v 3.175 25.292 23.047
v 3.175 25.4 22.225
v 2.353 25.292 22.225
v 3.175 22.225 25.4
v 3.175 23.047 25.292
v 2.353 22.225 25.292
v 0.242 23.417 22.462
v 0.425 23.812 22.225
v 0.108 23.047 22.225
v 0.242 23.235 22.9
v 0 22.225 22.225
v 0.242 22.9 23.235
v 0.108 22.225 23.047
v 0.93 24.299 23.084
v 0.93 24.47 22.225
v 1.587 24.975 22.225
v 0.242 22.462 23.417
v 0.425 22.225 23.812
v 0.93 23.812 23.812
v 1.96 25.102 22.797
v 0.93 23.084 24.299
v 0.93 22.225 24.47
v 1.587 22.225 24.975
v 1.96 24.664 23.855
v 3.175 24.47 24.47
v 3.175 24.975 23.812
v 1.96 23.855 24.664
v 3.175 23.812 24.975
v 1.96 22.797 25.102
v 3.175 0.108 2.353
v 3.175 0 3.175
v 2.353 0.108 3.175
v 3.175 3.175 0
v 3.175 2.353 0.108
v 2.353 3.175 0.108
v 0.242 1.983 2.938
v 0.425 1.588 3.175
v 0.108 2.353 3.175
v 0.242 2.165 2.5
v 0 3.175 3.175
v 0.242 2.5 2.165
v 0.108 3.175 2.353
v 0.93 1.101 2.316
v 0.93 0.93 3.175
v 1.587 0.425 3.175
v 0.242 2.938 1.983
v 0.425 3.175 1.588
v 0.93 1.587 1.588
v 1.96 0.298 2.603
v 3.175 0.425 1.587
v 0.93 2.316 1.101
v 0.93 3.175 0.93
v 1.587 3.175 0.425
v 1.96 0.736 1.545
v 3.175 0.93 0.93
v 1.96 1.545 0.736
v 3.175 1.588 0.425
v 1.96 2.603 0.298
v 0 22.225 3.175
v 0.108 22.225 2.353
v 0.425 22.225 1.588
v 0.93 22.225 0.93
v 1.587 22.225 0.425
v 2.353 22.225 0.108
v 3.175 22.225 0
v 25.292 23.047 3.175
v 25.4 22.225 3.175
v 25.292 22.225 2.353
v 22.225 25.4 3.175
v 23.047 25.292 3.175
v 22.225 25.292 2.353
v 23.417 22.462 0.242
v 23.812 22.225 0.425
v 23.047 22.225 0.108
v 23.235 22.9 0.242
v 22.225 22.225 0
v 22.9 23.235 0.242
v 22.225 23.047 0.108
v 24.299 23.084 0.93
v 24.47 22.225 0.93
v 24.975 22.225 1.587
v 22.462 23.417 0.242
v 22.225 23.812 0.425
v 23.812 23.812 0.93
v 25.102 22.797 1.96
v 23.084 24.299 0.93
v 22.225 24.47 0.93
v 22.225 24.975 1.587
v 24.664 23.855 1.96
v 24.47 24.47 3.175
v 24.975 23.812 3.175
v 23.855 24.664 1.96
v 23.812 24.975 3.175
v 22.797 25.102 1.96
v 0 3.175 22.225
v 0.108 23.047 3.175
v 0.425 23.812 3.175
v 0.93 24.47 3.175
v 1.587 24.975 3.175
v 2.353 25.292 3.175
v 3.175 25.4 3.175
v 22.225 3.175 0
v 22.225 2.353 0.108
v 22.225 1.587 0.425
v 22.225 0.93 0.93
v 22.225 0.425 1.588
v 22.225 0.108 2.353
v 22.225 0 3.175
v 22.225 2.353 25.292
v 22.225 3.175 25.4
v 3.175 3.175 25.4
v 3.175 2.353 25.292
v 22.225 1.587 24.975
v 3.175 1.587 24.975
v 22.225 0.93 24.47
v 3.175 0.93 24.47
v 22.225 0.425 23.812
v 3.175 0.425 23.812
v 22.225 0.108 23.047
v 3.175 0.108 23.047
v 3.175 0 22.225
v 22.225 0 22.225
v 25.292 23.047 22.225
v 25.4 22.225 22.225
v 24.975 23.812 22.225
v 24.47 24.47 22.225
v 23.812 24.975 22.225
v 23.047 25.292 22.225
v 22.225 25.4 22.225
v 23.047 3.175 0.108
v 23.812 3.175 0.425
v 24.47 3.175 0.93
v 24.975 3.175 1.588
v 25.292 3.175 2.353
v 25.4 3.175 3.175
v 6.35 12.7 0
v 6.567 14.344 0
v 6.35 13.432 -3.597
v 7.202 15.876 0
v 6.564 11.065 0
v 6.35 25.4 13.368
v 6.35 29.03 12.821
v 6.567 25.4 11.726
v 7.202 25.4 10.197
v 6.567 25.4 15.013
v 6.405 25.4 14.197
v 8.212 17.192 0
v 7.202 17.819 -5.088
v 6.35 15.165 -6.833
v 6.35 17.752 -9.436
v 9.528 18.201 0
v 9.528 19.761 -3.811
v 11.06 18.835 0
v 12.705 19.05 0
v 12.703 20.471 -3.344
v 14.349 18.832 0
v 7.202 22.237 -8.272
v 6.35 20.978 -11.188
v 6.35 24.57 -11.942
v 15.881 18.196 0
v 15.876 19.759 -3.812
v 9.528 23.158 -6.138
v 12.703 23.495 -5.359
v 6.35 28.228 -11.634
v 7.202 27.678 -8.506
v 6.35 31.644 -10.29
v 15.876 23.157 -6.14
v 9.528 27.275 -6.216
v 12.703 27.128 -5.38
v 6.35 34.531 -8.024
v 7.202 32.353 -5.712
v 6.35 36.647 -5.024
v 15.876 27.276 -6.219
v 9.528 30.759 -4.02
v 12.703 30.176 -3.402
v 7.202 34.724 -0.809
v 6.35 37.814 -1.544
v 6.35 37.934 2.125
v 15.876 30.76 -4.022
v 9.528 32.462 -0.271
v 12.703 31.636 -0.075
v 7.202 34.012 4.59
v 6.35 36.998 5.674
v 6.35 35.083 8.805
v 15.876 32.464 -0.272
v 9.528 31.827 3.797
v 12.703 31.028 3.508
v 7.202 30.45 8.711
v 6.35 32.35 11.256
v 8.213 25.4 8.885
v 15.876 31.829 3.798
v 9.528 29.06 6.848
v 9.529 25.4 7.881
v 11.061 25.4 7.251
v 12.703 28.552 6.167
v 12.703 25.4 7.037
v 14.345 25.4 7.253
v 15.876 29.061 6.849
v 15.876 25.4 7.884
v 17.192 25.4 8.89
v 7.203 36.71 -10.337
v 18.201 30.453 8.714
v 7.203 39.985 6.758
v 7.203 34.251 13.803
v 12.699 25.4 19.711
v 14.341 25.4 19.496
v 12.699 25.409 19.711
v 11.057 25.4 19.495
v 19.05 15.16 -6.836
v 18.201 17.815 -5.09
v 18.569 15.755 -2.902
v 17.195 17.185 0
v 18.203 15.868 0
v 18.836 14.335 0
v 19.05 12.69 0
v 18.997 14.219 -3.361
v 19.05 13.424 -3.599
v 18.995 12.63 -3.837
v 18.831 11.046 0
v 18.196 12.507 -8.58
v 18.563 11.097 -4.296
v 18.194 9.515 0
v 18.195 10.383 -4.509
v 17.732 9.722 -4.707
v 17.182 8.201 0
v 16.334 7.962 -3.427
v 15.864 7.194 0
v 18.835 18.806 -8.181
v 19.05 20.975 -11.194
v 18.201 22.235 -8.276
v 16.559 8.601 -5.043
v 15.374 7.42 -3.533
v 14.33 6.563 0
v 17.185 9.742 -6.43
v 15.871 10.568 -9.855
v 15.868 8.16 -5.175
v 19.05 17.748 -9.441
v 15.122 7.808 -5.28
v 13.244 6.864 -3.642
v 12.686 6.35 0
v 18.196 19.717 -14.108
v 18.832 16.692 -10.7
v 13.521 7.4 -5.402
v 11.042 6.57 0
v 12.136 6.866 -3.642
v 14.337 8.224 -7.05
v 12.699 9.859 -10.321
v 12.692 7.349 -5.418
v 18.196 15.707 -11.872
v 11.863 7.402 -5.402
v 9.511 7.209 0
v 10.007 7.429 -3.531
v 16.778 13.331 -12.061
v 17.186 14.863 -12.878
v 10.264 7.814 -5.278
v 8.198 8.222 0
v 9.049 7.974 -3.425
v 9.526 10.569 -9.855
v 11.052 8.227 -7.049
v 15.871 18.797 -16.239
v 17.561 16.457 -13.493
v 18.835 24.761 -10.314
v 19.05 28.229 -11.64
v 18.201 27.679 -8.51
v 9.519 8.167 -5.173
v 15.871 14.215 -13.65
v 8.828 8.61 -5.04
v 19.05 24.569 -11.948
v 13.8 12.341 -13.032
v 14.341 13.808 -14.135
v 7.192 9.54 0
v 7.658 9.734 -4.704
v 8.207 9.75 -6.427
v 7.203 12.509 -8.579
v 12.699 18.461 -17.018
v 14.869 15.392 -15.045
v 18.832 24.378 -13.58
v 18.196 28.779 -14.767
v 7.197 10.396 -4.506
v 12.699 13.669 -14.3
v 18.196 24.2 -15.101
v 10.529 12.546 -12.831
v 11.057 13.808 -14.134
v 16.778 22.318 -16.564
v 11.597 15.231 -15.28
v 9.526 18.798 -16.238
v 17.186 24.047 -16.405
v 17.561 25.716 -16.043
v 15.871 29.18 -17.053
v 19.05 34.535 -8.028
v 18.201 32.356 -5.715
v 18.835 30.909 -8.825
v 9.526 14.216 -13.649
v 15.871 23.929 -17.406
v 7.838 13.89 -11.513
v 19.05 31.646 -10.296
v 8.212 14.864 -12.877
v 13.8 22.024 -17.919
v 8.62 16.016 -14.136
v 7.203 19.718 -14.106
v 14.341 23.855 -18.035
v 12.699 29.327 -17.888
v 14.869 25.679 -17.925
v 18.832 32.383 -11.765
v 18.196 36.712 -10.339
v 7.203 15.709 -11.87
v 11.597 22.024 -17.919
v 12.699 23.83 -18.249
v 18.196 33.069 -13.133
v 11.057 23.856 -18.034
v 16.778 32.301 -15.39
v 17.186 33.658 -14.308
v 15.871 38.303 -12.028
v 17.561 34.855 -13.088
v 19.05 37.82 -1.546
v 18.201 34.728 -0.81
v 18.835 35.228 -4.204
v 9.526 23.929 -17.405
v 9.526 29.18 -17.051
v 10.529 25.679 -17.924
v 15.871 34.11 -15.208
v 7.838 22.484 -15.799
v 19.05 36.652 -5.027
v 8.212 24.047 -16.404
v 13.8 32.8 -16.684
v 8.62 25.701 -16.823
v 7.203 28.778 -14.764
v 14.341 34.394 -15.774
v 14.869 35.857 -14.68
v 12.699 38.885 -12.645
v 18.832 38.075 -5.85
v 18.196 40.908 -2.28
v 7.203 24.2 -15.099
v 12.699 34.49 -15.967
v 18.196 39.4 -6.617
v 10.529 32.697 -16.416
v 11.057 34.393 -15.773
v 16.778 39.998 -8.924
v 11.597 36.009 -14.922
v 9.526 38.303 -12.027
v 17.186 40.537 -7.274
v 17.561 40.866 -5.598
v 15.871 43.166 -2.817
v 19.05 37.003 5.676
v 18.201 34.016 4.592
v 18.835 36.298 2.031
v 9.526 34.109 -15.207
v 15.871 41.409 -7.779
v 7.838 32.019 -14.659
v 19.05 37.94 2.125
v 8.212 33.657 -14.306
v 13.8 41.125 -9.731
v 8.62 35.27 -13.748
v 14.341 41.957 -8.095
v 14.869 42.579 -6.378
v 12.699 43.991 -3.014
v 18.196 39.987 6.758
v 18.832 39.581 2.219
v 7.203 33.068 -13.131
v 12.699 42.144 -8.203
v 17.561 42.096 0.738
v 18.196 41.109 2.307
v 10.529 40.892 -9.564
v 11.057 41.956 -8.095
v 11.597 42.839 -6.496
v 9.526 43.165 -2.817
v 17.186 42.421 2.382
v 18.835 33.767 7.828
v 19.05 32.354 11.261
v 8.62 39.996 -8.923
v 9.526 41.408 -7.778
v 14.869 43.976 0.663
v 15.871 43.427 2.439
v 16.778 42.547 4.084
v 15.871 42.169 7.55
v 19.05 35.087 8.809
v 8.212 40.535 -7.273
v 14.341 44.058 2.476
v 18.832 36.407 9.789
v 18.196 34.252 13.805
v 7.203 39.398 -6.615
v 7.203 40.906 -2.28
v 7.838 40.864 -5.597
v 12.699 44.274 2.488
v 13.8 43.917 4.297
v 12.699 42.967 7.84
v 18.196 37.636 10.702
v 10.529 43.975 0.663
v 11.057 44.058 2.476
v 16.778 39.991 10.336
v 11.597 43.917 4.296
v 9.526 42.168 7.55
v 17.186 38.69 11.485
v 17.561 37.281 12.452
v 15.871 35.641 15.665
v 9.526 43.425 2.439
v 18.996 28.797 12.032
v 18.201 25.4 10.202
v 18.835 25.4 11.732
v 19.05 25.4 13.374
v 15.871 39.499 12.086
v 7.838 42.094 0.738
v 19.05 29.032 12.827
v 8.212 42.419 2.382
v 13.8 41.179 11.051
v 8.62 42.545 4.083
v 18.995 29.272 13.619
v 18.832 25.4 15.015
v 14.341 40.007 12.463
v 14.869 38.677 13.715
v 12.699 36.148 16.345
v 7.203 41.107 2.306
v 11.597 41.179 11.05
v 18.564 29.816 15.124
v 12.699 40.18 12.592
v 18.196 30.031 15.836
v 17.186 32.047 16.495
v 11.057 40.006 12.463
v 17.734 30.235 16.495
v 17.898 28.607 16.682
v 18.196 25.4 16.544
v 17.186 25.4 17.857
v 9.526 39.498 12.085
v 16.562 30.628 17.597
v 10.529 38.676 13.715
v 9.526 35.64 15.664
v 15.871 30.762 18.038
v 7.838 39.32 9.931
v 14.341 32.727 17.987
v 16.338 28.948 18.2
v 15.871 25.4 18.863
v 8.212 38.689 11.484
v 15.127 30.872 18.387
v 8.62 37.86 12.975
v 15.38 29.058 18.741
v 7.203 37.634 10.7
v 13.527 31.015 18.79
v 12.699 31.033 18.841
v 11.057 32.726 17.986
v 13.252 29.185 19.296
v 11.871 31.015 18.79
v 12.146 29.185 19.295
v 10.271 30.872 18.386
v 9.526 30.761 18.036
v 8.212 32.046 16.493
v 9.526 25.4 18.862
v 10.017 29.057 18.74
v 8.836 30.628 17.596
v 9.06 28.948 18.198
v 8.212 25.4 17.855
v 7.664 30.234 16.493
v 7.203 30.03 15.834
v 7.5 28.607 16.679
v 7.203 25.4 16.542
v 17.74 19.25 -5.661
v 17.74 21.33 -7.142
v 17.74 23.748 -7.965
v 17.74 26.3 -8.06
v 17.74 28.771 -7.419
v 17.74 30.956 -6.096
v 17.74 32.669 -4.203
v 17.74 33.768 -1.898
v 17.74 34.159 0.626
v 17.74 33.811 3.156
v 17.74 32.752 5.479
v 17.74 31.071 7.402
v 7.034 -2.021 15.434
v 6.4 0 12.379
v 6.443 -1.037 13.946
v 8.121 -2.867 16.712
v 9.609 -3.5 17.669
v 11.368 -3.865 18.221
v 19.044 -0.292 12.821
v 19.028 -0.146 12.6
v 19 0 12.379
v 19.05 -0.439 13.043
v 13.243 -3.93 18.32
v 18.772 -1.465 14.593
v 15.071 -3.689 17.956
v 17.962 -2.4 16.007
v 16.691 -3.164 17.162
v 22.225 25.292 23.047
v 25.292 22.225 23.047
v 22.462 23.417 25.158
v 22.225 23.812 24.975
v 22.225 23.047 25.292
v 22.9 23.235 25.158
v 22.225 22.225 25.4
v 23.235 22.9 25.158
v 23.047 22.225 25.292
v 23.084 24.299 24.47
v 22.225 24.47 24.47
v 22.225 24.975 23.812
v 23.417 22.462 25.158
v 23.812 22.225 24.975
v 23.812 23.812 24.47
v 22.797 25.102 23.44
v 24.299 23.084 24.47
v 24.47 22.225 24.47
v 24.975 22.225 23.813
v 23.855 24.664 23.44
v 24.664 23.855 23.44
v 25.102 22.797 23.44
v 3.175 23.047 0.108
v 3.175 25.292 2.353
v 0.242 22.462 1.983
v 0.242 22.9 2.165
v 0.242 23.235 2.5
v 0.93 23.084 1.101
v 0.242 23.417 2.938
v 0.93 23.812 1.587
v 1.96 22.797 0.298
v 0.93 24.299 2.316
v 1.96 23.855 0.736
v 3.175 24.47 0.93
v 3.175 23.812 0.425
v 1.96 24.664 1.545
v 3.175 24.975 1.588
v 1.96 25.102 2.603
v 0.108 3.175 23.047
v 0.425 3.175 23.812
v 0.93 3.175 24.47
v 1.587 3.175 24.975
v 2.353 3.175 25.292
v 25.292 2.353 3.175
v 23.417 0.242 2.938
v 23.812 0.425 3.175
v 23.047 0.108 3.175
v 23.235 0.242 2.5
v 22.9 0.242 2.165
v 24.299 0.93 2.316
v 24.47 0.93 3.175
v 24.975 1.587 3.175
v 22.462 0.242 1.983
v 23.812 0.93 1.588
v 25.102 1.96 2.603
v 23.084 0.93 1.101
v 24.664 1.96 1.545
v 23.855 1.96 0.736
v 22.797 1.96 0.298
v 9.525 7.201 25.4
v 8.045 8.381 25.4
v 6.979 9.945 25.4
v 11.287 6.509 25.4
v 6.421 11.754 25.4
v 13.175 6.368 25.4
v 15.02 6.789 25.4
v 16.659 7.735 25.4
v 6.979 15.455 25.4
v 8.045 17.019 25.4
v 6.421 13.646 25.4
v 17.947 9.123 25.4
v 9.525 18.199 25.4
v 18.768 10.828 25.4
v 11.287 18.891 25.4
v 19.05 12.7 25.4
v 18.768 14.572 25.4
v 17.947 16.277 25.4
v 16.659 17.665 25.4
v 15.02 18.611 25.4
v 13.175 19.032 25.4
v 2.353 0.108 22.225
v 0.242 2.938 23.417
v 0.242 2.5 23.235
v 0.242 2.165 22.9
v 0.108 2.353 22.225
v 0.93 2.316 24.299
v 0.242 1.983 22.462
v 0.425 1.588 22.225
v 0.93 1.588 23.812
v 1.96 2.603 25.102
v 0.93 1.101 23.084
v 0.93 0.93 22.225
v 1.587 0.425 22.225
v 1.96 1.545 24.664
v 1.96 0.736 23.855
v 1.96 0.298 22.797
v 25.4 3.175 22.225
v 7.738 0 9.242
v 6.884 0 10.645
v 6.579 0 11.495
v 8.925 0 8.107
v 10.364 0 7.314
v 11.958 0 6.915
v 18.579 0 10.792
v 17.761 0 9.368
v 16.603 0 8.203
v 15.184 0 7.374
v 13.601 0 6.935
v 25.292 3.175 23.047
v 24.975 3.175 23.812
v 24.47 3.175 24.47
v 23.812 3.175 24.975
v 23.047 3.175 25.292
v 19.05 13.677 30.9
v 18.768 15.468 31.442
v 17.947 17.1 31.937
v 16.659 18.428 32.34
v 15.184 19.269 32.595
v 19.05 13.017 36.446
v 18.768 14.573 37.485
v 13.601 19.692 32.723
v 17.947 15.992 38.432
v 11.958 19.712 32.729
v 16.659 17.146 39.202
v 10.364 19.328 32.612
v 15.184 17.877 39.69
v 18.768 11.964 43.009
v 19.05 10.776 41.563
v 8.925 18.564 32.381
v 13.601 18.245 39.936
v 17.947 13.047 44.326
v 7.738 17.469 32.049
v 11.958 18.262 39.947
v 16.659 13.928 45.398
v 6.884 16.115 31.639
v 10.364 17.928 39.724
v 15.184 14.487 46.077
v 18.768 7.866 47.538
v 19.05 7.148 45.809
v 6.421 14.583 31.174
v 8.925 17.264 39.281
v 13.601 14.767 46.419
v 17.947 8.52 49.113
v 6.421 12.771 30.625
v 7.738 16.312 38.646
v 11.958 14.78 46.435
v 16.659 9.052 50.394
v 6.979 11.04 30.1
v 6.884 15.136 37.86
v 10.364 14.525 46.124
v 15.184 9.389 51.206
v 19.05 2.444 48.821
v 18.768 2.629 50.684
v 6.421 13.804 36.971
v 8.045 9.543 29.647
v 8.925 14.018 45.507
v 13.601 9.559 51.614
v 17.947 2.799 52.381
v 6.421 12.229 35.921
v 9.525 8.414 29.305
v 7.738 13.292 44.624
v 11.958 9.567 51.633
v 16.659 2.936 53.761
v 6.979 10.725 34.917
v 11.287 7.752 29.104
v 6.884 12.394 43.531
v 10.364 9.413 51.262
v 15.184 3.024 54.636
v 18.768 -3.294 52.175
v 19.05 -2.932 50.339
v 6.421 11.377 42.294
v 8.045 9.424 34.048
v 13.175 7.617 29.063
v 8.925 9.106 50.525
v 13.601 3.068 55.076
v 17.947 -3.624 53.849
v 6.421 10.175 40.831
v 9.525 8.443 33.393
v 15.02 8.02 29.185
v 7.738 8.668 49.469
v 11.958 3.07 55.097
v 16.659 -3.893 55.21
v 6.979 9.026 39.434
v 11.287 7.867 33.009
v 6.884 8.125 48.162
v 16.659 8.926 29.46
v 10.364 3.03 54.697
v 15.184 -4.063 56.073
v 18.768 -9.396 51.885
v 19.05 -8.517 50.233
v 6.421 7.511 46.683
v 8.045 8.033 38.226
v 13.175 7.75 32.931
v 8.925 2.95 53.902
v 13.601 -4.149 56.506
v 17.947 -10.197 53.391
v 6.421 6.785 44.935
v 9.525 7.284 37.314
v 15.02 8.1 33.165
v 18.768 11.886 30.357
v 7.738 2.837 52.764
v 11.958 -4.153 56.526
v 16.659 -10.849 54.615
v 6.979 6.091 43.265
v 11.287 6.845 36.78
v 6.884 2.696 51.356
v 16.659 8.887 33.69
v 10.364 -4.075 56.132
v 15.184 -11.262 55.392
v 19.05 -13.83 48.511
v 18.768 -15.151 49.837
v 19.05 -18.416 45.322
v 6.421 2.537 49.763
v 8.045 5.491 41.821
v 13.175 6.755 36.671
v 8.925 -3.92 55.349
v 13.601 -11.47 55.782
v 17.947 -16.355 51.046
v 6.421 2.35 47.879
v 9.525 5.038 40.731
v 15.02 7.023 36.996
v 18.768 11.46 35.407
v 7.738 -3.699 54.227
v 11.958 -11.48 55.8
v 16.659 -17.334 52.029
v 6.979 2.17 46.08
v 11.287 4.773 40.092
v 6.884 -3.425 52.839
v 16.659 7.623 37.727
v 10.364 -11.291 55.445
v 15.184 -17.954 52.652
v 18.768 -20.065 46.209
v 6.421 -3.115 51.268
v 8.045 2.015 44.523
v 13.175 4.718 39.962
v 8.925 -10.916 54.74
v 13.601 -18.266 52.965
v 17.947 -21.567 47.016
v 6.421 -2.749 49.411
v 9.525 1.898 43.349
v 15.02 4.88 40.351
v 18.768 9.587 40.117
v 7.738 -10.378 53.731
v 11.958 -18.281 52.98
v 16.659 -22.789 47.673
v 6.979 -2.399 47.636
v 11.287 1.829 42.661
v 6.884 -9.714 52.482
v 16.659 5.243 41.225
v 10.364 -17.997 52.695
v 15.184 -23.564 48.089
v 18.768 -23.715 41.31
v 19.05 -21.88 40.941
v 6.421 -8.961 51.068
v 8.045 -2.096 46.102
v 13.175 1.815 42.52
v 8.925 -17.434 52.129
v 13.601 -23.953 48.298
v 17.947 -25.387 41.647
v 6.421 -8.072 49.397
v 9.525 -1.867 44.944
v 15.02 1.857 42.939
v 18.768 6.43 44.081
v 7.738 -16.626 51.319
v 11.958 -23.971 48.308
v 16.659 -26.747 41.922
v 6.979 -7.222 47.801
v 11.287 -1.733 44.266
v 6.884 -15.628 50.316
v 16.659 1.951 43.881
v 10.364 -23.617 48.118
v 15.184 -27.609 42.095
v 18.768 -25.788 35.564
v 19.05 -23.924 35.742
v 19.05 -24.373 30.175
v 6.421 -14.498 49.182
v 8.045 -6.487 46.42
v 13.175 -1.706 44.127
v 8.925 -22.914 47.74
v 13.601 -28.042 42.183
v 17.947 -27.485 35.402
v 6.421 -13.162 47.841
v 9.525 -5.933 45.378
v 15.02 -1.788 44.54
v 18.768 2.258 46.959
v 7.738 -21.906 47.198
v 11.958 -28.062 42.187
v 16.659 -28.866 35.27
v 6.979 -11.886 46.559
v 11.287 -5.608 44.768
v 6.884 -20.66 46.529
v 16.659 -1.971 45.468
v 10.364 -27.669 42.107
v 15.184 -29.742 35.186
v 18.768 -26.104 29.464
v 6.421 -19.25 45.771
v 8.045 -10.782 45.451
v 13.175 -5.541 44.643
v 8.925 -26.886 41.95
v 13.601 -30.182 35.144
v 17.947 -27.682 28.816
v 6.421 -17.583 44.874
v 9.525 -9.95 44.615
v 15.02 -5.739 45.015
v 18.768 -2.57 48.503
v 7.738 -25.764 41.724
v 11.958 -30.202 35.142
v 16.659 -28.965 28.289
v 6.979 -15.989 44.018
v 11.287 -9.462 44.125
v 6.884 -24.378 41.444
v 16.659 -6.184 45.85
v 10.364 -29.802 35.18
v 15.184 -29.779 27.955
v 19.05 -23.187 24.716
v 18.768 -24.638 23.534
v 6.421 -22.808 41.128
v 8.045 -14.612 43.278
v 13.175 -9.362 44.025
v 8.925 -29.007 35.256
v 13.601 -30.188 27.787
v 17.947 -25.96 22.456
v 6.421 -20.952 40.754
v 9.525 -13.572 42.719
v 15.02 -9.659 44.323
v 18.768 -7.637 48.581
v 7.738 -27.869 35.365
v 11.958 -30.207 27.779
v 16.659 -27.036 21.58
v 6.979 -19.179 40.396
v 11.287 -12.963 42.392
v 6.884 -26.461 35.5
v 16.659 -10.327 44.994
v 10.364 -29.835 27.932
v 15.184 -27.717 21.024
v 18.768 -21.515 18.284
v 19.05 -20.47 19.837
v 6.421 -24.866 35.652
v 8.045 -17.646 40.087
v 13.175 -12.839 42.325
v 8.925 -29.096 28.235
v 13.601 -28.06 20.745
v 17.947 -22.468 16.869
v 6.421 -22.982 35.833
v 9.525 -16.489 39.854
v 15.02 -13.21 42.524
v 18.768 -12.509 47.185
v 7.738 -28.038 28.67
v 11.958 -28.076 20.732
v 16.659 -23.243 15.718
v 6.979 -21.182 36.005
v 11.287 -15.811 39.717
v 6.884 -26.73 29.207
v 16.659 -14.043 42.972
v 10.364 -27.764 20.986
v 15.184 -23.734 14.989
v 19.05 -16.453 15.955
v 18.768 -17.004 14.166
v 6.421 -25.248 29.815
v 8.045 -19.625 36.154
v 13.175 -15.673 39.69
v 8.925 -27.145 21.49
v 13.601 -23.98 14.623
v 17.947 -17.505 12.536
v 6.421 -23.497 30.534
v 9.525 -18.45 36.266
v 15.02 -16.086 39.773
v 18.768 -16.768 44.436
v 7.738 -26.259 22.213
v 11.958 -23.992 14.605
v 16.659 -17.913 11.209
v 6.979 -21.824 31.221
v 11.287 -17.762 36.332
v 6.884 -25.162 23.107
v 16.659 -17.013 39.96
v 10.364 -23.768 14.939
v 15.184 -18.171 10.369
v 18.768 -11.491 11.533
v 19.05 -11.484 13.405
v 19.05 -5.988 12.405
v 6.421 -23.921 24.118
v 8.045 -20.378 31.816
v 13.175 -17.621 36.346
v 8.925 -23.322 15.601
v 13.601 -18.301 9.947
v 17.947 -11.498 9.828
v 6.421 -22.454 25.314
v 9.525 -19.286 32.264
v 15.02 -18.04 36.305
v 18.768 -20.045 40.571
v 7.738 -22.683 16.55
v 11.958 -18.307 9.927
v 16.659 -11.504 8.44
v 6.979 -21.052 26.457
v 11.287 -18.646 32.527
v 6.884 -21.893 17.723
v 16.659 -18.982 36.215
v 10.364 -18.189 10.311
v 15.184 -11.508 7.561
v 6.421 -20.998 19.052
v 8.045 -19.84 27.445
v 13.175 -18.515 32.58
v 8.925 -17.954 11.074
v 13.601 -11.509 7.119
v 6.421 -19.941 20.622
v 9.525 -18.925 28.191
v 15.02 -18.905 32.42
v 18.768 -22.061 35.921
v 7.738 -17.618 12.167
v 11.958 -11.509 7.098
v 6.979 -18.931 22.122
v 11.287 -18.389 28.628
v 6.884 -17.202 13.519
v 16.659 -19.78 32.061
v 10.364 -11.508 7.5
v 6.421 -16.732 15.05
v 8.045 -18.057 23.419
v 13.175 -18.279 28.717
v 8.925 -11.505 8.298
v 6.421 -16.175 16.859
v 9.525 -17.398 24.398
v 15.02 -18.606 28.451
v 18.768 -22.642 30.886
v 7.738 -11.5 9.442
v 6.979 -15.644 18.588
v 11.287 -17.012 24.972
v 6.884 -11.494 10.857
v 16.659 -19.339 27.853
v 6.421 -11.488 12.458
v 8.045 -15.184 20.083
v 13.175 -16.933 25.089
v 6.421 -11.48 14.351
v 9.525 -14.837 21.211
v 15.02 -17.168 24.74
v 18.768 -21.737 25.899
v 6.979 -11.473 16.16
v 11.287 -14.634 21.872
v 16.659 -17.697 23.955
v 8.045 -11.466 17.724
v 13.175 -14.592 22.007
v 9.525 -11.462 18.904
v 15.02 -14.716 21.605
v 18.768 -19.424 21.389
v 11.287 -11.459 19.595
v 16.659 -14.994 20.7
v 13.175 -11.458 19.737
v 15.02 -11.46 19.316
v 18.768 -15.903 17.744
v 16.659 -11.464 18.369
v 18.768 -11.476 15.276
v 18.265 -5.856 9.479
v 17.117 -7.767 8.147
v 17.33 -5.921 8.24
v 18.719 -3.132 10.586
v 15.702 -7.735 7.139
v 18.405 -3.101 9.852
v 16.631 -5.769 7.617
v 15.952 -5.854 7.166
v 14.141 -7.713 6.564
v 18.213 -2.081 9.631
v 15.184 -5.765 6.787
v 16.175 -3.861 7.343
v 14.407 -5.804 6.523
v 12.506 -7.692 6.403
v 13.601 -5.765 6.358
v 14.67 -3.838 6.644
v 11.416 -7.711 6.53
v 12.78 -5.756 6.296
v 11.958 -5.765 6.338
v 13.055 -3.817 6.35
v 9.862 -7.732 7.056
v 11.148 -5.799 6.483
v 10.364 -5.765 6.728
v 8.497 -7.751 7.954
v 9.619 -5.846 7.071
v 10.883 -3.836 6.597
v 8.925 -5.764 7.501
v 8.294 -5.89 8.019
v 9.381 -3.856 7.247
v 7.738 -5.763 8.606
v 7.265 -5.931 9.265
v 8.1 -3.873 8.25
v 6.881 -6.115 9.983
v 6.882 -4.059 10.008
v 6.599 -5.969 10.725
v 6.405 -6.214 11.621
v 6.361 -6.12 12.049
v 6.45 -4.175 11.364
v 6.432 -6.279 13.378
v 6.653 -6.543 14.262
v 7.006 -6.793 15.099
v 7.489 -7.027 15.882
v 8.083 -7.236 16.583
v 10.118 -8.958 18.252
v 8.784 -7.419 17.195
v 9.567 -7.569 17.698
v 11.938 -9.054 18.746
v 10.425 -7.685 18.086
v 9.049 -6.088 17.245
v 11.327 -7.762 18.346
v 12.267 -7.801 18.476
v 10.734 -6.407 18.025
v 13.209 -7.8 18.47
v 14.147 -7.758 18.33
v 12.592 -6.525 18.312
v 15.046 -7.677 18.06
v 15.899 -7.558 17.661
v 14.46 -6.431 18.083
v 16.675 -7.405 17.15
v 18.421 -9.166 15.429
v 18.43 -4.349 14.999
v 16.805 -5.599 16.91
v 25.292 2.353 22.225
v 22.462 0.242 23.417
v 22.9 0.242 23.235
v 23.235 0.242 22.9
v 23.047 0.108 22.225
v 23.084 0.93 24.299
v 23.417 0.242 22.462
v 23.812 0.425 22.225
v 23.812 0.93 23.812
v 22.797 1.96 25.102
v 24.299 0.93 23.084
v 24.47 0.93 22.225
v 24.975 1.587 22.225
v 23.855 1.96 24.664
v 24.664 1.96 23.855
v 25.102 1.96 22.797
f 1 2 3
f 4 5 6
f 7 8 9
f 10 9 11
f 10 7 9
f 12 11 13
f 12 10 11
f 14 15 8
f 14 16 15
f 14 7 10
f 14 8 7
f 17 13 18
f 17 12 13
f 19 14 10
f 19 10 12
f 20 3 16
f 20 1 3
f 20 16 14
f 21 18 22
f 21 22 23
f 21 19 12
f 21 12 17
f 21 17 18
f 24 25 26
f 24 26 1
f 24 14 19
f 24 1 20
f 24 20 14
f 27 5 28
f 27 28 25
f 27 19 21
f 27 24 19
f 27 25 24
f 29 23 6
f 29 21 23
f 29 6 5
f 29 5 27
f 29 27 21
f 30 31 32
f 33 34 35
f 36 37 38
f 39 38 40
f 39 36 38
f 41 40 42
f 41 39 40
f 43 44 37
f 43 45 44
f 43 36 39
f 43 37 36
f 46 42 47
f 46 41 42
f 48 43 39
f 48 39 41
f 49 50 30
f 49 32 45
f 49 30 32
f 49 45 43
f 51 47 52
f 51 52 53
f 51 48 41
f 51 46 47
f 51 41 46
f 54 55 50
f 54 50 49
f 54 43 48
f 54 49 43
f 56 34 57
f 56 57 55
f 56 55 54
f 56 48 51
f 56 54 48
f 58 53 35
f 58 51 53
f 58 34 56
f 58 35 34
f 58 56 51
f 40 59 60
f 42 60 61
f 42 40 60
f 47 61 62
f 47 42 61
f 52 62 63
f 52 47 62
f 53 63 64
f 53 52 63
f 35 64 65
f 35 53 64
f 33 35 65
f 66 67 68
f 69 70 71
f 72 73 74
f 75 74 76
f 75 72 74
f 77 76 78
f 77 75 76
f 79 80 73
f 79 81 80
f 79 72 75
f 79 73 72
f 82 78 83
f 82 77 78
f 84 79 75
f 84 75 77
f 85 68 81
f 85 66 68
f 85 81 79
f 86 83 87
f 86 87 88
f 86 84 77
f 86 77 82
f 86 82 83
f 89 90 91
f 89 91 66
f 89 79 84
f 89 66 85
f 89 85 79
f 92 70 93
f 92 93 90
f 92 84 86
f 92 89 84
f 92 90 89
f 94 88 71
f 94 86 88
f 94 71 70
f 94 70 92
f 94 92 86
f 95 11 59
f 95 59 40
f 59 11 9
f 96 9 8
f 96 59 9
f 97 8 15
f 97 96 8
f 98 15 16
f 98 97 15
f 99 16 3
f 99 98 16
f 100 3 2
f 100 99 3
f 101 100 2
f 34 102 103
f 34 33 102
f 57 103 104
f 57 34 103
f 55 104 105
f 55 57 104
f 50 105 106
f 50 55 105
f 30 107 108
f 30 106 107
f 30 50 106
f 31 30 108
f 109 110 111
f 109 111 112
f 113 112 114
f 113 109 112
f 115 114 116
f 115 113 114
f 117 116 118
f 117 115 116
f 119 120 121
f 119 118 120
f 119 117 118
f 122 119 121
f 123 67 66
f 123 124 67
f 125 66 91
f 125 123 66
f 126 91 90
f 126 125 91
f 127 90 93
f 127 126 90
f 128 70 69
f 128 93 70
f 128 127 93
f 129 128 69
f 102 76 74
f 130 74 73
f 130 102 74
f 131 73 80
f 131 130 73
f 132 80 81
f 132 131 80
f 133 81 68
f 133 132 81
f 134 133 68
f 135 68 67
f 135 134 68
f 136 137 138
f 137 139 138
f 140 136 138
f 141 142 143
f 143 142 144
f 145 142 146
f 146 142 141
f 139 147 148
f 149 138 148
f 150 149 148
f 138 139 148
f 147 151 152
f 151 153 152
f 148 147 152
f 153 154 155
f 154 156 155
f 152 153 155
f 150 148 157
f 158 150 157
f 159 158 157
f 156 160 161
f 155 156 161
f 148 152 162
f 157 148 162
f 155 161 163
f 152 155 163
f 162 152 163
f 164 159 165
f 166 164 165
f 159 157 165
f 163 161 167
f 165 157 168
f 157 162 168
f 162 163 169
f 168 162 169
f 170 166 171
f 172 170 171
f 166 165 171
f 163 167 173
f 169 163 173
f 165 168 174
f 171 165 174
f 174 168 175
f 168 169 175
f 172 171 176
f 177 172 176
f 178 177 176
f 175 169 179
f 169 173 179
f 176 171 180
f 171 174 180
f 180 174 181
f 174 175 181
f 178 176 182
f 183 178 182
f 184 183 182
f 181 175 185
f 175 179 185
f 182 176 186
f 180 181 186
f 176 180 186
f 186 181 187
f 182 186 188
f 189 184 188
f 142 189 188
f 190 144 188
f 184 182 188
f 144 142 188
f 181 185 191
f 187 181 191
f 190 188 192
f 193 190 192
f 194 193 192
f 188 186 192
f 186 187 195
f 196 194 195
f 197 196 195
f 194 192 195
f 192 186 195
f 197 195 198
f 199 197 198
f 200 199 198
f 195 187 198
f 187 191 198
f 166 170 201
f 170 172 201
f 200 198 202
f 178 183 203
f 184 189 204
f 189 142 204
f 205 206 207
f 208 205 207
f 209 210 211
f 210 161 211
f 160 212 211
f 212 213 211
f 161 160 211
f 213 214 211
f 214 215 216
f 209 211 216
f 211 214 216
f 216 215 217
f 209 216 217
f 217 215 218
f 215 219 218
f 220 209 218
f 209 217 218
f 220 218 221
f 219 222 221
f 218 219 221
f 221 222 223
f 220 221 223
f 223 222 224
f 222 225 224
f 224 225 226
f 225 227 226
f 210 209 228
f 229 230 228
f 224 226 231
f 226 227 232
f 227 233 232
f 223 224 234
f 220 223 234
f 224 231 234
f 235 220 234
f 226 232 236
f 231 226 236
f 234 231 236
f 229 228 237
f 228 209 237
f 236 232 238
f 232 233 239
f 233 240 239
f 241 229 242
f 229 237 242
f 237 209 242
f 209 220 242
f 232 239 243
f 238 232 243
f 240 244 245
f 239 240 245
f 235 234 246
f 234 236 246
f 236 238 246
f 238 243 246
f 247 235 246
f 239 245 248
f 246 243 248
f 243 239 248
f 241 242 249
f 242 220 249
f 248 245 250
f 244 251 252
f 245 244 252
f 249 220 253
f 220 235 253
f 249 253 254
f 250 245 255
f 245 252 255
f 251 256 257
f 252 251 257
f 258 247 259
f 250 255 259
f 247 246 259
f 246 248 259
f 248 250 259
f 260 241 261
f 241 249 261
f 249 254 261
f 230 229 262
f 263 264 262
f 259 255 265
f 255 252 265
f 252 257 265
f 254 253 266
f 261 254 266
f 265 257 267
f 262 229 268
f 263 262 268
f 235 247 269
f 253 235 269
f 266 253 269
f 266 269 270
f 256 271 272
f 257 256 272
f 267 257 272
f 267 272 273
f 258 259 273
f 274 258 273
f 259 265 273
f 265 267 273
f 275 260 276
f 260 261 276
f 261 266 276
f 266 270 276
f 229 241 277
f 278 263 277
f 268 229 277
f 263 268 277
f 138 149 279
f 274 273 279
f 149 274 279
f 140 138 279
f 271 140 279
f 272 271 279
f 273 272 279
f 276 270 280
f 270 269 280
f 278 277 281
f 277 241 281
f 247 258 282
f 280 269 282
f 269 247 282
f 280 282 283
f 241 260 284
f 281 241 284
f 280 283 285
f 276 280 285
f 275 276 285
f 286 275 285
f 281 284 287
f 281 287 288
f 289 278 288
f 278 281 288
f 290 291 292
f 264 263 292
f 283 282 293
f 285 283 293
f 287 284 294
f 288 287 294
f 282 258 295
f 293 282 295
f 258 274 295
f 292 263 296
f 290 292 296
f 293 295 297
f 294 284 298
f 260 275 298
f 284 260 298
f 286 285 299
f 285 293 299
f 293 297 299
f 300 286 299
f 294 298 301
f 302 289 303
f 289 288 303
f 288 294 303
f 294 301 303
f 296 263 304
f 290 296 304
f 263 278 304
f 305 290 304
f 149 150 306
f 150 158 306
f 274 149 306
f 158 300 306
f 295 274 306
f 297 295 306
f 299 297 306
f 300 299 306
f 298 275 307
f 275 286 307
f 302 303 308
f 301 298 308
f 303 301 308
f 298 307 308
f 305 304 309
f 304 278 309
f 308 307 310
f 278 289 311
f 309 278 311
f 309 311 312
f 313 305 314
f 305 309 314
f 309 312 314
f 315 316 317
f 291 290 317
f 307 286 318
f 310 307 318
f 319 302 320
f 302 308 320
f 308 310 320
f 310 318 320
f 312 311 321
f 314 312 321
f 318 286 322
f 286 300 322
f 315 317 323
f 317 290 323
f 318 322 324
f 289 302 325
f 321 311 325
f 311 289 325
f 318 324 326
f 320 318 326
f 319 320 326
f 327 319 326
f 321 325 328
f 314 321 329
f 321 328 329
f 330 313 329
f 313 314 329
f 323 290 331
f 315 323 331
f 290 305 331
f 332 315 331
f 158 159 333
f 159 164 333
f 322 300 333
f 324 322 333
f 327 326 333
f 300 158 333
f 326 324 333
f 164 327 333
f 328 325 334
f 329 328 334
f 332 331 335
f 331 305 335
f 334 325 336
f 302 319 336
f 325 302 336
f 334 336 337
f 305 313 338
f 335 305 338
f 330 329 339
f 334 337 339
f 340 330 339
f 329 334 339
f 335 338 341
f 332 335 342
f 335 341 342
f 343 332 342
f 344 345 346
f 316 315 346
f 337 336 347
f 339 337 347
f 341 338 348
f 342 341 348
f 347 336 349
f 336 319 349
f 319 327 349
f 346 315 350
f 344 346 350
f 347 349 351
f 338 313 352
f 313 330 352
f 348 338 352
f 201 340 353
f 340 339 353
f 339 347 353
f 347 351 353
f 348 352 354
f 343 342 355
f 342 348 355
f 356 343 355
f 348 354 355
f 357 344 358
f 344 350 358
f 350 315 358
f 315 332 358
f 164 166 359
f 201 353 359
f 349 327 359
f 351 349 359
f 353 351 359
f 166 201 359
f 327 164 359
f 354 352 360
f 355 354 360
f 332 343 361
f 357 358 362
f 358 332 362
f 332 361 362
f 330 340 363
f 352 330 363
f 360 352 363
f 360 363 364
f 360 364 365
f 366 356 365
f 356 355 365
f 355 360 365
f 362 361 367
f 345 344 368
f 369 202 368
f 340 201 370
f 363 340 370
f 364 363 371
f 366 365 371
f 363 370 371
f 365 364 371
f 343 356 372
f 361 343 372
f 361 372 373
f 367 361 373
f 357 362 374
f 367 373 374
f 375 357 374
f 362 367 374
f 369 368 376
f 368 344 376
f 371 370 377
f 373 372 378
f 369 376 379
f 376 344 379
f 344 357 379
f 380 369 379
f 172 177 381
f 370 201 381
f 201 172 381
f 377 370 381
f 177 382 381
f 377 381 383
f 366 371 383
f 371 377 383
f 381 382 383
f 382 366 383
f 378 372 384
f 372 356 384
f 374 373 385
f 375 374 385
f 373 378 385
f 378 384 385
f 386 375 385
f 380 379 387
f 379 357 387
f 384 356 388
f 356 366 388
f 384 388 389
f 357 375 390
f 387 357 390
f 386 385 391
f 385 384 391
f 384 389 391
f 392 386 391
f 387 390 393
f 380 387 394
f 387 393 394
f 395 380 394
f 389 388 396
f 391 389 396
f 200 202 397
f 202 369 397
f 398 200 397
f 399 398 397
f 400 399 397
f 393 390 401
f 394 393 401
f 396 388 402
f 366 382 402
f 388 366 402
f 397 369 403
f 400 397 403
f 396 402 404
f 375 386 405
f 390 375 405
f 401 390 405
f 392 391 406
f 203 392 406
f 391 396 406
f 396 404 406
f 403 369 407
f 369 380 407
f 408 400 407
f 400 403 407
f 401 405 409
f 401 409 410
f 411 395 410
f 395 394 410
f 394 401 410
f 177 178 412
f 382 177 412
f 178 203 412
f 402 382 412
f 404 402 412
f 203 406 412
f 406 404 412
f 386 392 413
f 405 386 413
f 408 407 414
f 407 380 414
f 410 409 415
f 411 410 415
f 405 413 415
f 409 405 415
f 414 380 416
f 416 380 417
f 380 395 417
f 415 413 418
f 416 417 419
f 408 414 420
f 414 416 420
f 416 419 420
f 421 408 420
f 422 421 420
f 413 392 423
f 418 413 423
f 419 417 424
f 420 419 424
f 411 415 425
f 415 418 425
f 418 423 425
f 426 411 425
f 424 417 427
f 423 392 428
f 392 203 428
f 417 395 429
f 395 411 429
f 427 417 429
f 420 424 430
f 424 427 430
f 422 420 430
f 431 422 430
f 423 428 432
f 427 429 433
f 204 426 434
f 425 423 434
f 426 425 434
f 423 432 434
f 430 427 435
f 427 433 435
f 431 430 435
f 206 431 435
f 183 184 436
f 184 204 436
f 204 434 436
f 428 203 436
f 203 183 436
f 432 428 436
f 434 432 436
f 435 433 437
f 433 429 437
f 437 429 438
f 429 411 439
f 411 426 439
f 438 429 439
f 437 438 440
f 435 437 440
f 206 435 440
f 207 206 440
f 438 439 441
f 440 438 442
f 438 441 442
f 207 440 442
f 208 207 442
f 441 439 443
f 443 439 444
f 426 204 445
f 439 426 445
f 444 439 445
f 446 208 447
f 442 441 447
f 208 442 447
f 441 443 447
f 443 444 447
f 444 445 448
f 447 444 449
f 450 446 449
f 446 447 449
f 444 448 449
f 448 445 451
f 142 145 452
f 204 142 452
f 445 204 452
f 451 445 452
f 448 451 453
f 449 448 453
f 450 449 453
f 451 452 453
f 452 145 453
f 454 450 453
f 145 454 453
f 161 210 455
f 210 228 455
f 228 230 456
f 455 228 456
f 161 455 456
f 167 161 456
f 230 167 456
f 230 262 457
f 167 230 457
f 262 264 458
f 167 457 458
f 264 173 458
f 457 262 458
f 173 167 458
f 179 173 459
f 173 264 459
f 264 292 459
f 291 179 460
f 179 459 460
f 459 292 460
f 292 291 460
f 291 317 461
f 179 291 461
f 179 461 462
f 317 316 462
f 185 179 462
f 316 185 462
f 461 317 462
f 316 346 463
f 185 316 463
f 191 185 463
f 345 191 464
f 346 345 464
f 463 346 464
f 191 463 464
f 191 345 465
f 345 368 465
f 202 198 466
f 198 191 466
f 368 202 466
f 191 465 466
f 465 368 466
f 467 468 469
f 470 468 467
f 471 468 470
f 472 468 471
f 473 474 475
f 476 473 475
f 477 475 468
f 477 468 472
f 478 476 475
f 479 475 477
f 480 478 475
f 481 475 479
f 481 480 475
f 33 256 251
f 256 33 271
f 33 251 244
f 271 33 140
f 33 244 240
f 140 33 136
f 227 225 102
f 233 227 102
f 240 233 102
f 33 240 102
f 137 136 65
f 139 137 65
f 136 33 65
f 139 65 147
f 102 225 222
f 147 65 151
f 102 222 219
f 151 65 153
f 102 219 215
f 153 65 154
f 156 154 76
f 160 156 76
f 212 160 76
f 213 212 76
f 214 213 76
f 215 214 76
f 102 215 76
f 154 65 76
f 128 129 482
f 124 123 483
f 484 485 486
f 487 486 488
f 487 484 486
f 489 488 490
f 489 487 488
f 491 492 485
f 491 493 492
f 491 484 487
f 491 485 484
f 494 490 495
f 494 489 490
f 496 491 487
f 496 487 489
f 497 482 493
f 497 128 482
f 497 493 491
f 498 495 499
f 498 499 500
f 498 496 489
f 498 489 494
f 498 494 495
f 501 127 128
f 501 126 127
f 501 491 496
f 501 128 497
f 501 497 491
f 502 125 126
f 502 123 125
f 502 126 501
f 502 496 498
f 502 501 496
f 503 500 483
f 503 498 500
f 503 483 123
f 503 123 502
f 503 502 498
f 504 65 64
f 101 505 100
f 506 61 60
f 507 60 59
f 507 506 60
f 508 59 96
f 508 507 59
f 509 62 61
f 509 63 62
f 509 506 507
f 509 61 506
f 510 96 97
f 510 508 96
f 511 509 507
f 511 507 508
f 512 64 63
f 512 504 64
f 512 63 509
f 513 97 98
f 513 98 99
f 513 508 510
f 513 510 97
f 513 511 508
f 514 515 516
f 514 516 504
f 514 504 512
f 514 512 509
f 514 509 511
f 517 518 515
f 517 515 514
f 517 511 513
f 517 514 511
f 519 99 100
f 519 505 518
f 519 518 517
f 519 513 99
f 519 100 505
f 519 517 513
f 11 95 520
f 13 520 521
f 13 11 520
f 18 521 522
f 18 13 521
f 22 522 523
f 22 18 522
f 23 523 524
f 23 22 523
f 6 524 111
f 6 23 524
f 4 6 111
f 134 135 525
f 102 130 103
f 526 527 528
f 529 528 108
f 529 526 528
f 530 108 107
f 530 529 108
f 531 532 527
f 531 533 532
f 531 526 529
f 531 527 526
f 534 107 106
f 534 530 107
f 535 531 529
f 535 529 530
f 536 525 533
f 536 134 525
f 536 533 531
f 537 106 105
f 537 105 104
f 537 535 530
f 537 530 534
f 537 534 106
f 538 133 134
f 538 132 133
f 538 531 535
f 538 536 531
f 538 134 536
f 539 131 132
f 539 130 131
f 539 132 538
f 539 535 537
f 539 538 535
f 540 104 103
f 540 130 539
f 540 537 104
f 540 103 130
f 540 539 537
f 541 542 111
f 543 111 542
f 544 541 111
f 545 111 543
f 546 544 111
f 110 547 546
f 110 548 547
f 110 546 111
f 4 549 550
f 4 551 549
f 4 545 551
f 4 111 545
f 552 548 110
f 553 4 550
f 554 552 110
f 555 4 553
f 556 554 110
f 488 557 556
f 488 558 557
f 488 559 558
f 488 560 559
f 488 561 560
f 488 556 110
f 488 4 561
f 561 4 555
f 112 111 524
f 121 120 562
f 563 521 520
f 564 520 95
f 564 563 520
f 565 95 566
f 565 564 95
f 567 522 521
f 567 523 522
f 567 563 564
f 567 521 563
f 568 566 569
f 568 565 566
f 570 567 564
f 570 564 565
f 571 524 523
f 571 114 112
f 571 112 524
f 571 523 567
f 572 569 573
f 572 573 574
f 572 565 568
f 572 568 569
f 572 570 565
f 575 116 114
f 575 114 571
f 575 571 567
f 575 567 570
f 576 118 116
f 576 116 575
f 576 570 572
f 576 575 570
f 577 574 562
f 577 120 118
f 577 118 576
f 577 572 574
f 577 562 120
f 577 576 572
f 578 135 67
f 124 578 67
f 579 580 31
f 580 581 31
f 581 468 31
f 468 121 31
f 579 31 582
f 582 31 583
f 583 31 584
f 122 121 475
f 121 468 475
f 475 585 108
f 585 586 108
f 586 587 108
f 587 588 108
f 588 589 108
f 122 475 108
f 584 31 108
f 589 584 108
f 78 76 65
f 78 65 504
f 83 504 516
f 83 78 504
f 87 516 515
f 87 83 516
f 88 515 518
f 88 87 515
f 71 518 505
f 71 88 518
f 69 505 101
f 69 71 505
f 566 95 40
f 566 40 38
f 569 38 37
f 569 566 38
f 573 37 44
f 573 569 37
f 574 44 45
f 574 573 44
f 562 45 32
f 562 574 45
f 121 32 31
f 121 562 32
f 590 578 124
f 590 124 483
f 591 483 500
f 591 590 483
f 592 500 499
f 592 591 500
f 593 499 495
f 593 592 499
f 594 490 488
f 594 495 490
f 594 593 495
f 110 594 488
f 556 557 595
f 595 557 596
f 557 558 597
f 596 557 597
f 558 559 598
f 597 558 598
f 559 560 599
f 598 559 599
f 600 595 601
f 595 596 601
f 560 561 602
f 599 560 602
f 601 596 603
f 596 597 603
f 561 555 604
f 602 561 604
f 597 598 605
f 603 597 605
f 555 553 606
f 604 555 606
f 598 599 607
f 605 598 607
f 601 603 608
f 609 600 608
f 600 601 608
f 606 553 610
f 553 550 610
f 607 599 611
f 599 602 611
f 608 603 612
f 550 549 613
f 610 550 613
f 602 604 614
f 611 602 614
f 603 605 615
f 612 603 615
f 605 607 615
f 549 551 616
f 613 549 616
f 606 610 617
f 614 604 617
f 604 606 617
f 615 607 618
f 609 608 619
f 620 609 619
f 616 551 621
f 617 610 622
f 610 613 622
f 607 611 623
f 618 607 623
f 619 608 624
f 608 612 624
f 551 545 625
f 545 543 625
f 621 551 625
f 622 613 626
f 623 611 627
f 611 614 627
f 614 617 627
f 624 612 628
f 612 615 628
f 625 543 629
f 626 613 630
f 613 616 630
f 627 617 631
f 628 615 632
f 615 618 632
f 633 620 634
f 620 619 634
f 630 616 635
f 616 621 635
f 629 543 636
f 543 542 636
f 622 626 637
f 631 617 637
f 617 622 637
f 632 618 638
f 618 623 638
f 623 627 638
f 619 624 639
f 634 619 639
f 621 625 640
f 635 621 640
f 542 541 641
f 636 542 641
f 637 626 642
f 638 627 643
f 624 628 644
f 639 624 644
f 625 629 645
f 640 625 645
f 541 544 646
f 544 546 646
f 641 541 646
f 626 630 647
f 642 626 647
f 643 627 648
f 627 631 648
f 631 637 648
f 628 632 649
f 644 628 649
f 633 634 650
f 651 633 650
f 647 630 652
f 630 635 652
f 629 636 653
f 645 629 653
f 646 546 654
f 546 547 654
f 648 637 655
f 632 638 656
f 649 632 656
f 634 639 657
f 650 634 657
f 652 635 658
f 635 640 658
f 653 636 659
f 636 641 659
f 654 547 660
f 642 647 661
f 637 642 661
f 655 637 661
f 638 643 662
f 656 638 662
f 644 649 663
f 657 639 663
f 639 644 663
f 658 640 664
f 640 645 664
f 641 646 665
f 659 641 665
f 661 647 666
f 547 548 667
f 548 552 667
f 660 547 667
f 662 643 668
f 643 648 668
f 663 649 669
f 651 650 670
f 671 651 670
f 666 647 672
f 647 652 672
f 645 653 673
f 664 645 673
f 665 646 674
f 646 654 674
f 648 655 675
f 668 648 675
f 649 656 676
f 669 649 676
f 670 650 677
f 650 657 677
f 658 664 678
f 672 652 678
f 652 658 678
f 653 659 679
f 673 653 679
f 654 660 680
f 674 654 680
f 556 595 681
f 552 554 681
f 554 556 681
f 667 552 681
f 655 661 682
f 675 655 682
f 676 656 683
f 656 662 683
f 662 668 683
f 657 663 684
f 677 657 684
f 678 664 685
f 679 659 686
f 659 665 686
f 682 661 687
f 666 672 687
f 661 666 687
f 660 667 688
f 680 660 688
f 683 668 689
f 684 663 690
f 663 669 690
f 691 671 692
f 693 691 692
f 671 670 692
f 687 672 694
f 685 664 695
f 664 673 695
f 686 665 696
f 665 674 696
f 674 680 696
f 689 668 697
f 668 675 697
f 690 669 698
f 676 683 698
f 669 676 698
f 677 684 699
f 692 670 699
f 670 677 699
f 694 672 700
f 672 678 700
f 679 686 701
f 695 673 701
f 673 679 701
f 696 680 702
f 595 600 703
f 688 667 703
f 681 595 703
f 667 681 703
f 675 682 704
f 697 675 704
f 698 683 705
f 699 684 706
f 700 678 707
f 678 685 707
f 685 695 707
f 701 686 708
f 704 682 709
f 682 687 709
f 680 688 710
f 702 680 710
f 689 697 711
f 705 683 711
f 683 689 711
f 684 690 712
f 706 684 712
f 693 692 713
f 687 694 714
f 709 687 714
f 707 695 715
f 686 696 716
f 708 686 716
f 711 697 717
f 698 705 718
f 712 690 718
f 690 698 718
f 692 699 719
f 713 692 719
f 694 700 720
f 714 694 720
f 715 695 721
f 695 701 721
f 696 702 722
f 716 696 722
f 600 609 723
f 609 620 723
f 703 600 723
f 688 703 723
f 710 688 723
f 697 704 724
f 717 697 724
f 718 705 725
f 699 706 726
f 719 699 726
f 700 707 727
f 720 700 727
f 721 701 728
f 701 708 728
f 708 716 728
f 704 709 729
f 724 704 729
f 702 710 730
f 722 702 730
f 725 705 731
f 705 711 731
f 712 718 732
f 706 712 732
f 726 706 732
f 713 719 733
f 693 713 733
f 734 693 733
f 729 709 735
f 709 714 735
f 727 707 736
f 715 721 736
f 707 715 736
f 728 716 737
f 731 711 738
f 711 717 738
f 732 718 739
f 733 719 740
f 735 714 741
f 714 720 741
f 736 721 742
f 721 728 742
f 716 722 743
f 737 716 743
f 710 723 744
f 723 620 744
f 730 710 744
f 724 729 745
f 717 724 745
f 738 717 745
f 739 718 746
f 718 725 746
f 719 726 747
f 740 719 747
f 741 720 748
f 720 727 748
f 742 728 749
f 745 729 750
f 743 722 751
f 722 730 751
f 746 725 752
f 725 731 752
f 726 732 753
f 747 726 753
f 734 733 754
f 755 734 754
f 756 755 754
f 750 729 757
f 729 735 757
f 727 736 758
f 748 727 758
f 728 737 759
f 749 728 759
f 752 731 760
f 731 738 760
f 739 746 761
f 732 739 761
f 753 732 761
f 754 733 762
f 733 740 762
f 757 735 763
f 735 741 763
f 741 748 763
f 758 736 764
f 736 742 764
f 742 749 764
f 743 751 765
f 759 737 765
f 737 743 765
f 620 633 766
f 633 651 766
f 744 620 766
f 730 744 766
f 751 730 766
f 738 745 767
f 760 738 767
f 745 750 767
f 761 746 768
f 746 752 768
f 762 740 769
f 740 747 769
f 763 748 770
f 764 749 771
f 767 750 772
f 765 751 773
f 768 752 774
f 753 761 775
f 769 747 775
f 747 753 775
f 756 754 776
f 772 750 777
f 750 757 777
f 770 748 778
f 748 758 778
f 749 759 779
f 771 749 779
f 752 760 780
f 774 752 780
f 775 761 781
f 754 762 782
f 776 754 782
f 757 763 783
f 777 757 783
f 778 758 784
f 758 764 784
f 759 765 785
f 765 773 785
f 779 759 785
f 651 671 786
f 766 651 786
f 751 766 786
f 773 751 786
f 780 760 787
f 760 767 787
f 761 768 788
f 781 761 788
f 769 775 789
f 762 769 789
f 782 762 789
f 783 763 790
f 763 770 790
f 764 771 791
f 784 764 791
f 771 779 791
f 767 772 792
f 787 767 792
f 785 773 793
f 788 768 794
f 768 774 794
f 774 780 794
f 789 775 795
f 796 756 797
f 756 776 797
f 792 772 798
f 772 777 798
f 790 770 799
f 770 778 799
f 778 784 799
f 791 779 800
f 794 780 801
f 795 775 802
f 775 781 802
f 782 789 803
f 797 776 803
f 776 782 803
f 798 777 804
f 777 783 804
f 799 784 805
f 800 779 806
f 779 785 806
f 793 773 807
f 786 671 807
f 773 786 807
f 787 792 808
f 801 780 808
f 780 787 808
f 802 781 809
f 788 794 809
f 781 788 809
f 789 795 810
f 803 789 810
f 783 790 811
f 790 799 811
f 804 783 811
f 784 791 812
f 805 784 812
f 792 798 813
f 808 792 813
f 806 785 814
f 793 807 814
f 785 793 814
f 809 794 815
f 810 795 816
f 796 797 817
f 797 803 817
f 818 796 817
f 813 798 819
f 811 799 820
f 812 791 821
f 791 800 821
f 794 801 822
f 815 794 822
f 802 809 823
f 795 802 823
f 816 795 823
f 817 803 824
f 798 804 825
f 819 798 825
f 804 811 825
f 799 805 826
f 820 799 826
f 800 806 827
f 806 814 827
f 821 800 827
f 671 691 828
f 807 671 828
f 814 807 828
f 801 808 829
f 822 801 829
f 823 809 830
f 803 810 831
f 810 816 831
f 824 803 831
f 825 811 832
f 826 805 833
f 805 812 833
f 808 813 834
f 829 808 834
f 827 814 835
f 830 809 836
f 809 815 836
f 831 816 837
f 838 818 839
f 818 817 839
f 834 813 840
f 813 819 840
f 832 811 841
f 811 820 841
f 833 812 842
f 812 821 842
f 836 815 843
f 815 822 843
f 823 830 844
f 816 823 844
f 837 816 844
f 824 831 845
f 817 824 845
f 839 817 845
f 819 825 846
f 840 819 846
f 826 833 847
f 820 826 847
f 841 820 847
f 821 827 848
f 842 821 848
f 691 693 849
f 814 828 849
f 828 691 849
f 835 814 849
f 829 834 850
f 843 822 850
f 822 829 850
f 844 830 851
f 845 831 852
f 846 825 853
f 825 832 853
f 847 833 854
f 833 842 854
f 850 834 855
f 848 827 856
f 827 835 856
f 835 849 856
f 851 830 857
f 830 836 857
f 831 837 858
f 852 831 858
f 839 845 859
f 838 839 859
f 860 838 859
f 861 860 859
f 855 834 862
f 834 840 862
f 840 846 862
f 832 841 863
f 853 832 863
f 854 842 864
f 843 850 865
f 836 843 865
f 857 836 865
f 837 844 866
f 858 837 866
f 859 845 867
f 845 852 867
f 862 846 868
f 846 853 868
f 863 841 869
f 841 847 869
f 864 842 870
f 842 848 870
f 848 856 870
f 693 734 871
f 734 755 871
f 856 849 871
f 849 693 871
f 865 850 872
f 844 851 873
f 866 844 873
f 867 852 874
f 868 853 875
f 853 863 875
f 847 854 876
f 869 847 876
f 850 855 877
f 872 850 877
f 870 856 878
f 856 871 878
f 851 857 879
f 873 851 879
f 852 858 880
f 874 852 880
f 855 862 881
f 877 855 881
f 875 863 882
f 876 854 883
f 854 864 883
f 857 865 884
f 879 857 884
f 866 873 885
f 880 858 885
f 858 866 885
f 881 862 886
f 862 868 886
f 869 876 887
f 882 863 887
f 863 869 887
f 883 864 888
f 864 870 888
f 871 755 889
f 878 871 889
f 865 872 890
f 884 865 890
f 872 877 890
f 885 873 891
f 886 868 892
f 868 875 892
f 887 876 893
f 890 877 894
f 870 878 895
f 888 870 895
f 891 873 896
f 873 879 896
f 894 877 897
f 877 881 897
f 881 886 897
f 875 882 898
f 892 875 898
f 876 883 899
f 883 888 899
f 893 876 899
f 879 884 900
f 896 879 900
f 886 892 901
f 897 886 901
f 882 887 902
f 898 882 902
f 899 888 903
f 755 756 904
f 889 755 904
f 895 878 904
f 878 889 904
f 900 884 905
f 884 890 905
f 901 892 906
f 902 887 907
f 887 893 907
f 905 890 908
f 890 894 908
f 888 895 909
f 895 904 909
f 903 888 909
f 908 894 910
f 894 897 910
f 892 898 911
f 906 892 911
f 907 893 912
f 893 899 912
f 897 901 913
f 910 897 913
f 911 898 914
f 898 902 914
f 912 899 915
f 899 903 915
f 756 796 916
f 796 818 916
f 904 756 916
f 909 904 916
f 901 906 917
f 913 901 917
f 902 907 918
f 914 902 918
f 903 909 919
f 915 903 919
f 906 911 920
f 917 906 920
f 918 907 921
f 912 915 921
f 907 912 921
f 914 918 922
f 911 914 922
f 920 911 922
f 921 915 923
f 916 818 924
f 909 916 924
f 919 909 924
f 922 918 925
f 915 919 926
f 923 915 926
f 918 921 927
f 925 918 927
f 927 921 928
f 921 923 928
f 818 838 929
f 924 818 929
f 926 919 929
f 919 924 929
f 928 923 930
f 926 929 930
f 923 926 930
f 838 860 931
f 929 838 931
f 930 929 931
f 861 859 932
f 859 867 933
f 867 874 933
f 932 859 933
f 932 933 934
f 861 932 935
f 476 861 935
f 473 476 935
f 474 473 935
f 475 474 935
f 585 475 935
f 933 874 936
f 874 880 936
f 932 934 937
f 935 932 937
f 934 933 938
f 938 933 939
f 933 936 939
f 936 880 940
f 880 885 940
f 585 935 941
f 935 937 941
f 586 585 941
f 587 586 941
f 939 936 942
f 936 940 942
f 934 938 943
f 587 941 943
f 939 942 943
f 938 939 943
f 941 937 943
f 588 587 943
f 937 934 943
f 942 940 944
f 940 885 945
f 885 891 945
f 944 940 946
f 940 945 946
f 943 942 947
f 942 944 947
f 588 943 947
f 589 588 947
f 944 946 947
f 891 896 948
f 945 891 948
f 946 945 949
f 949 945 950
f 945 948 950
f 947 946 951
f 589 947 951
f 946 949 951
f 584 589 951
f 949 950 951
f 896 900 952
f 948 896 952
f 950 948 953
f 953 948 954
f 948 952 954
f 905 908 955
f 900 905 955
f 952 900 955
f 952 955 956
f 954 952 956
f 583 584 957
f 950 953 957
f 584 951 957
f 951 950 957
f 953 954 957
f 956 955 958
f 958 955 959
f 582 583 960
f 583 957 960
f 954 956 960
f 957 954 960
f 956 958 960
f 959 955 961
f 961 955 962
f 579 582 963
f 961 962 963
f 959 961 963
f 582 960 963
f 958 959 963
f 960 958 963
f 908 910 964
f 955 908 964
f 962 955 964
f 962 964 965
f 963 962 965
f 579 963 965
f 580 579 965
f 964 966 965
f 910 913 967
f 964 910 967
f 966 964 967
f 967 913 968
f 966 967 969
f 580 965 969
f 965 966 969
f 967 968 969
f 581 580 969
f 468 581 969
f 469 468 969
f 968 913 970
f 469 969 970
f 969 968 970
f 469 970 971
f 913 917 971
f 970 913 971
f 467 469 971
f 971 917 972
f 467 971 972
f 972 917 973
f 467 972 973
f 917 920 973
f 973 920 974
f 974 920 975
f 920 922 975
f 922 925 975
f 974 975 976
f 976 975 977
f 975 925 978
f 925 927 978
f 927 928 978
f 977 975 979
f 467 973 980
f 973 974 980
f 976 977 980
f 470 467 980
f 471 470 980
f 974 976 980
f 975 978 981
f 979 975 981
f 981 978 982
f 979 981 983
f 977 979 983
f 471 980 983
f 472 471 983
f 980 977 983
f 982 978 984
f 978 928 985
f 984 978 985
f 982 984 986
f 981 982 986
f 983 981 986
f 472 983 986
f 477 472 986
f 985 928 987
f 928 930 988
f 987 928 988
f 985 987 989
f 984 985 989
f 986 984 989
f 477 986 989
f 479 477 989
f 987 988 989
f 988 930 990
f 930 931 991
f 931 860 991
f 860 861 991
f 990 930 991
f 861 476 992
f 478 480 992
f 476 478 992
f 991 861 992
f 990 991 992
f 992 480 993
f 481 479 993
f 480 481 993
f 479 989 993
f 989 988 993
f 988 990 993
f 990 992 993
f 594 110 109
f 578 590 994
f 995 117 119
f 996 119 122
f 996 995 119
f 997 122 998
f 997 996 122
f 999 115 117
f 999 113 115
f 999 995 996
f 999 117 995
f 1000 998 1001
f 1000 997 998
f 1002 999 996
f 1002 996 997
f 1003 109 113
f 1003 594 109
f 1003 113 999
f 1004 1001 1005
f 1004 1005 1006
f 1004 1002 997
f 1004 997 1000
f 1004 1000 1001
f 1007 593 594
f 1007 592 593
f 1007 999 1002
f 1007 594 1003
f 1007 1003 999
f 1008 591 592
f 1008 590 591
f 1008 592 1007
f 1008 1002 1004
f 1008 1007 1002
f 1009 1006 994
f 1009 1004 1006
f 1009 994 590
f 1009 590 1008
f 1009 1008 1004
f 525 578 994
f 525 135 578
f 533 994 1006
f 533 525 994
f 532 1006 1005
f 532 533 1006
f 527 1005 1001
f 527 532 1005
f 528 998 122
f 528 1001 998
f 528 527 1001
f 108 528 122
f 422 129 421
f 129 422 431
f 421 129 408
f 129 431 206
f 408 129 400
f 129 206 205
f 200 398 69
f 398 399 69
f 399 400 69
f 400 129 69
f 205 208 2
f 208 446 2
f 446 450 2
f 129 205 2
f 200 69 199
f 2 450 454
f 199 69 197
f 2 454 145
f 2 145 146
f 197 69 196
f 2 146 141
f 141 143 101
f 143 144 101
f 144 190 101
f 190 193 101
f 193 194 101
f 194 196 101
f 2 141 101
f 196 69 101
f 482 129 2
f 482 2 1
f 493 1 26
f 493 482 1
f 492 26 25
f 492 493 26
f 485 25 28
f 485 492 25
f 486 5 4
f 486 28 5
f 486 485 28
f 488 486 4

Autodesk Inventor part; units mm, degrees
ref_plane "YZ Plane" through (0, 0, 0) normal (1, 0, 0) x (0, 1, 0)
ref_plane "XZ Plane" through (0, 0, 0) normal (0, 1, 0) x (-1, 0, 0)
sketch "Sketch1" plane through (0, 0, 0) normal (0, 0, 1) x (1, 0, 0)
  line L0 (0, 0) -> (25.4, 0)
  line L1 (25.4, 0) -> (25.4, 25.4)
  line L2 (25.4, 25.4) -> (0, 25.4)
  line L3 (0, 25.4) -> (0, 0)
  dimension "d0" = 25.4
  dimension "d1" = 25.4
extrude "Extrusion1" add sketch "Sketch1" along normal blind 25.4
sketch "Sketch2" plane through (0, 25.4, 0) normal (0, 1, 0) x (1, 0, 0)
  line L0 (0, 0) -> (0, -25.4) projected
  line L1 (25.4, -25.4) -> (0, -25.4) projected
  circle A0 centre (12.7, -12.7) radius 6.35
  dimension "d4" = 12.7
  dimension "d5" = 12.7
  dimension "d6" = 12.7
sketch "Sketch3" plane through (0, 0, 25.4) normal (0, 0, 1) x (1, 0, 0)
  line L0 (25.4, 25.4) -> (0, 25.4) projected
  line L1 (0, 25.4) -> (0, 0) projected
  circle A0 centre (12.7, 12.7) radius 6.35
  dimension "d7" = 12.7
  dimension "d8" = 12.7
  dimension "d9" = 12.7
sketch "Sketch4" plane through (0, 0, 0) normal (0, -1, 0) x (1, 0, 0)
  line L0 (25.4, 0) -> (25.4, 25.4) projected
  line L1 (0, 25.4) -> (25.4, 25.4) projected
  circle A0 centre (12.7, 12.7) radius 6.35
  point P0 (0, 0)
  dimension "d10" = 12.7
  dimension "d11" = 12.7
  dimension "d12" = 12.7
sketch "Sketch5" plane through (0, 0, 0) normal (0, 0, -1) x (-1, 0, 0)
  line L0 (-25.4, 0) -> (-25.4, 25.4) projected
  line L1 (0, 0) -> (-25.4, 0) projected
  circle A0 centre (-12.7, 12.7) radius 6.35
  dimension "d13" = 12.7
  dimension "d14" = 12.7
  dimension "d15" = 12.7
ref_plane "Work Plane1" through (12.7, 12.7, 25.4) normal (1, 0, 0) x (0, 0, -1)
sketch "Sketch6" plane through (12.7, 12.7, 25.4) normal (1, 0, 0) x (0, 0, -1)
  line L0 (25.4, -12.7) -> (25.4, 12.7) projected
  arc A0 (25.4, 0) -> (12.7731, 12.6779) centre (7.1702, -5.5295) ccw
  arc A1 (25.4, 0) -> (12.7731, 12.6779) centre (25.4731, 12.6998) ccw
  arc A2 (0, 0) -> (12.3568, -13.1392) centre (-6.0452, -18.0654) ccw
  dimension "d17" = 19.05
  dimension "d18" = 12.7
  dimension "d19" = 19.05
sweep "Sweep1" add profiles "Sketch3" path "Sketch6" path curves A2
sketch "Sketch7" plane through (12.7, 12.7, 25.4) normal (1, 0, 0) x (0, 0, -1)
  arc A0 (25.3272, -0.0369) -> (12.0094, 12.137) centre (24.6991, 12.6475) ccw
  point P0 (25.4, -12.7)
  dimension "d23" = 12.7
sweep "Sweep2" add profiles "Sketch5" path "Sketch7"
fillet "Fillet1" radius 3.175 1 edges at (25.4, 25.4, 12.7)
fillet "Fillet2" radius 3.175 3 edges at (24.4701, 24.4701, 0) (11.1125, 25.4, 0) (25.4, 11.1125, 0)
fillet "Fillet3" radius 3.175 3 edges at (24.4701, 24.4701, 25.4) (11.1125, 25.4, 25.4) (25.4, 11.1125, 25.4)
fillet "Fillet4" radius 3.175 5 edges at (24.4701, 0, 24.4701) (11.1125, 0, 25.4) (24.4701, 0, 0.9299) (11.1125, 0, 0) (25.4, 0, 12.7)
fillet "Fillet5" radius 3.175 8 edges at (0, 0.9299, 24.4701) (0, 12.7, 25.4) (0, 24.4701, 24.4701) (0, 25.4, 12.7) (0, 24.4701, 0.9299) (0, 12.7, 0) (0, 0.9299, 0.9299) (0, 0, 12.7)
properties part number "Lauren's funky piece"
